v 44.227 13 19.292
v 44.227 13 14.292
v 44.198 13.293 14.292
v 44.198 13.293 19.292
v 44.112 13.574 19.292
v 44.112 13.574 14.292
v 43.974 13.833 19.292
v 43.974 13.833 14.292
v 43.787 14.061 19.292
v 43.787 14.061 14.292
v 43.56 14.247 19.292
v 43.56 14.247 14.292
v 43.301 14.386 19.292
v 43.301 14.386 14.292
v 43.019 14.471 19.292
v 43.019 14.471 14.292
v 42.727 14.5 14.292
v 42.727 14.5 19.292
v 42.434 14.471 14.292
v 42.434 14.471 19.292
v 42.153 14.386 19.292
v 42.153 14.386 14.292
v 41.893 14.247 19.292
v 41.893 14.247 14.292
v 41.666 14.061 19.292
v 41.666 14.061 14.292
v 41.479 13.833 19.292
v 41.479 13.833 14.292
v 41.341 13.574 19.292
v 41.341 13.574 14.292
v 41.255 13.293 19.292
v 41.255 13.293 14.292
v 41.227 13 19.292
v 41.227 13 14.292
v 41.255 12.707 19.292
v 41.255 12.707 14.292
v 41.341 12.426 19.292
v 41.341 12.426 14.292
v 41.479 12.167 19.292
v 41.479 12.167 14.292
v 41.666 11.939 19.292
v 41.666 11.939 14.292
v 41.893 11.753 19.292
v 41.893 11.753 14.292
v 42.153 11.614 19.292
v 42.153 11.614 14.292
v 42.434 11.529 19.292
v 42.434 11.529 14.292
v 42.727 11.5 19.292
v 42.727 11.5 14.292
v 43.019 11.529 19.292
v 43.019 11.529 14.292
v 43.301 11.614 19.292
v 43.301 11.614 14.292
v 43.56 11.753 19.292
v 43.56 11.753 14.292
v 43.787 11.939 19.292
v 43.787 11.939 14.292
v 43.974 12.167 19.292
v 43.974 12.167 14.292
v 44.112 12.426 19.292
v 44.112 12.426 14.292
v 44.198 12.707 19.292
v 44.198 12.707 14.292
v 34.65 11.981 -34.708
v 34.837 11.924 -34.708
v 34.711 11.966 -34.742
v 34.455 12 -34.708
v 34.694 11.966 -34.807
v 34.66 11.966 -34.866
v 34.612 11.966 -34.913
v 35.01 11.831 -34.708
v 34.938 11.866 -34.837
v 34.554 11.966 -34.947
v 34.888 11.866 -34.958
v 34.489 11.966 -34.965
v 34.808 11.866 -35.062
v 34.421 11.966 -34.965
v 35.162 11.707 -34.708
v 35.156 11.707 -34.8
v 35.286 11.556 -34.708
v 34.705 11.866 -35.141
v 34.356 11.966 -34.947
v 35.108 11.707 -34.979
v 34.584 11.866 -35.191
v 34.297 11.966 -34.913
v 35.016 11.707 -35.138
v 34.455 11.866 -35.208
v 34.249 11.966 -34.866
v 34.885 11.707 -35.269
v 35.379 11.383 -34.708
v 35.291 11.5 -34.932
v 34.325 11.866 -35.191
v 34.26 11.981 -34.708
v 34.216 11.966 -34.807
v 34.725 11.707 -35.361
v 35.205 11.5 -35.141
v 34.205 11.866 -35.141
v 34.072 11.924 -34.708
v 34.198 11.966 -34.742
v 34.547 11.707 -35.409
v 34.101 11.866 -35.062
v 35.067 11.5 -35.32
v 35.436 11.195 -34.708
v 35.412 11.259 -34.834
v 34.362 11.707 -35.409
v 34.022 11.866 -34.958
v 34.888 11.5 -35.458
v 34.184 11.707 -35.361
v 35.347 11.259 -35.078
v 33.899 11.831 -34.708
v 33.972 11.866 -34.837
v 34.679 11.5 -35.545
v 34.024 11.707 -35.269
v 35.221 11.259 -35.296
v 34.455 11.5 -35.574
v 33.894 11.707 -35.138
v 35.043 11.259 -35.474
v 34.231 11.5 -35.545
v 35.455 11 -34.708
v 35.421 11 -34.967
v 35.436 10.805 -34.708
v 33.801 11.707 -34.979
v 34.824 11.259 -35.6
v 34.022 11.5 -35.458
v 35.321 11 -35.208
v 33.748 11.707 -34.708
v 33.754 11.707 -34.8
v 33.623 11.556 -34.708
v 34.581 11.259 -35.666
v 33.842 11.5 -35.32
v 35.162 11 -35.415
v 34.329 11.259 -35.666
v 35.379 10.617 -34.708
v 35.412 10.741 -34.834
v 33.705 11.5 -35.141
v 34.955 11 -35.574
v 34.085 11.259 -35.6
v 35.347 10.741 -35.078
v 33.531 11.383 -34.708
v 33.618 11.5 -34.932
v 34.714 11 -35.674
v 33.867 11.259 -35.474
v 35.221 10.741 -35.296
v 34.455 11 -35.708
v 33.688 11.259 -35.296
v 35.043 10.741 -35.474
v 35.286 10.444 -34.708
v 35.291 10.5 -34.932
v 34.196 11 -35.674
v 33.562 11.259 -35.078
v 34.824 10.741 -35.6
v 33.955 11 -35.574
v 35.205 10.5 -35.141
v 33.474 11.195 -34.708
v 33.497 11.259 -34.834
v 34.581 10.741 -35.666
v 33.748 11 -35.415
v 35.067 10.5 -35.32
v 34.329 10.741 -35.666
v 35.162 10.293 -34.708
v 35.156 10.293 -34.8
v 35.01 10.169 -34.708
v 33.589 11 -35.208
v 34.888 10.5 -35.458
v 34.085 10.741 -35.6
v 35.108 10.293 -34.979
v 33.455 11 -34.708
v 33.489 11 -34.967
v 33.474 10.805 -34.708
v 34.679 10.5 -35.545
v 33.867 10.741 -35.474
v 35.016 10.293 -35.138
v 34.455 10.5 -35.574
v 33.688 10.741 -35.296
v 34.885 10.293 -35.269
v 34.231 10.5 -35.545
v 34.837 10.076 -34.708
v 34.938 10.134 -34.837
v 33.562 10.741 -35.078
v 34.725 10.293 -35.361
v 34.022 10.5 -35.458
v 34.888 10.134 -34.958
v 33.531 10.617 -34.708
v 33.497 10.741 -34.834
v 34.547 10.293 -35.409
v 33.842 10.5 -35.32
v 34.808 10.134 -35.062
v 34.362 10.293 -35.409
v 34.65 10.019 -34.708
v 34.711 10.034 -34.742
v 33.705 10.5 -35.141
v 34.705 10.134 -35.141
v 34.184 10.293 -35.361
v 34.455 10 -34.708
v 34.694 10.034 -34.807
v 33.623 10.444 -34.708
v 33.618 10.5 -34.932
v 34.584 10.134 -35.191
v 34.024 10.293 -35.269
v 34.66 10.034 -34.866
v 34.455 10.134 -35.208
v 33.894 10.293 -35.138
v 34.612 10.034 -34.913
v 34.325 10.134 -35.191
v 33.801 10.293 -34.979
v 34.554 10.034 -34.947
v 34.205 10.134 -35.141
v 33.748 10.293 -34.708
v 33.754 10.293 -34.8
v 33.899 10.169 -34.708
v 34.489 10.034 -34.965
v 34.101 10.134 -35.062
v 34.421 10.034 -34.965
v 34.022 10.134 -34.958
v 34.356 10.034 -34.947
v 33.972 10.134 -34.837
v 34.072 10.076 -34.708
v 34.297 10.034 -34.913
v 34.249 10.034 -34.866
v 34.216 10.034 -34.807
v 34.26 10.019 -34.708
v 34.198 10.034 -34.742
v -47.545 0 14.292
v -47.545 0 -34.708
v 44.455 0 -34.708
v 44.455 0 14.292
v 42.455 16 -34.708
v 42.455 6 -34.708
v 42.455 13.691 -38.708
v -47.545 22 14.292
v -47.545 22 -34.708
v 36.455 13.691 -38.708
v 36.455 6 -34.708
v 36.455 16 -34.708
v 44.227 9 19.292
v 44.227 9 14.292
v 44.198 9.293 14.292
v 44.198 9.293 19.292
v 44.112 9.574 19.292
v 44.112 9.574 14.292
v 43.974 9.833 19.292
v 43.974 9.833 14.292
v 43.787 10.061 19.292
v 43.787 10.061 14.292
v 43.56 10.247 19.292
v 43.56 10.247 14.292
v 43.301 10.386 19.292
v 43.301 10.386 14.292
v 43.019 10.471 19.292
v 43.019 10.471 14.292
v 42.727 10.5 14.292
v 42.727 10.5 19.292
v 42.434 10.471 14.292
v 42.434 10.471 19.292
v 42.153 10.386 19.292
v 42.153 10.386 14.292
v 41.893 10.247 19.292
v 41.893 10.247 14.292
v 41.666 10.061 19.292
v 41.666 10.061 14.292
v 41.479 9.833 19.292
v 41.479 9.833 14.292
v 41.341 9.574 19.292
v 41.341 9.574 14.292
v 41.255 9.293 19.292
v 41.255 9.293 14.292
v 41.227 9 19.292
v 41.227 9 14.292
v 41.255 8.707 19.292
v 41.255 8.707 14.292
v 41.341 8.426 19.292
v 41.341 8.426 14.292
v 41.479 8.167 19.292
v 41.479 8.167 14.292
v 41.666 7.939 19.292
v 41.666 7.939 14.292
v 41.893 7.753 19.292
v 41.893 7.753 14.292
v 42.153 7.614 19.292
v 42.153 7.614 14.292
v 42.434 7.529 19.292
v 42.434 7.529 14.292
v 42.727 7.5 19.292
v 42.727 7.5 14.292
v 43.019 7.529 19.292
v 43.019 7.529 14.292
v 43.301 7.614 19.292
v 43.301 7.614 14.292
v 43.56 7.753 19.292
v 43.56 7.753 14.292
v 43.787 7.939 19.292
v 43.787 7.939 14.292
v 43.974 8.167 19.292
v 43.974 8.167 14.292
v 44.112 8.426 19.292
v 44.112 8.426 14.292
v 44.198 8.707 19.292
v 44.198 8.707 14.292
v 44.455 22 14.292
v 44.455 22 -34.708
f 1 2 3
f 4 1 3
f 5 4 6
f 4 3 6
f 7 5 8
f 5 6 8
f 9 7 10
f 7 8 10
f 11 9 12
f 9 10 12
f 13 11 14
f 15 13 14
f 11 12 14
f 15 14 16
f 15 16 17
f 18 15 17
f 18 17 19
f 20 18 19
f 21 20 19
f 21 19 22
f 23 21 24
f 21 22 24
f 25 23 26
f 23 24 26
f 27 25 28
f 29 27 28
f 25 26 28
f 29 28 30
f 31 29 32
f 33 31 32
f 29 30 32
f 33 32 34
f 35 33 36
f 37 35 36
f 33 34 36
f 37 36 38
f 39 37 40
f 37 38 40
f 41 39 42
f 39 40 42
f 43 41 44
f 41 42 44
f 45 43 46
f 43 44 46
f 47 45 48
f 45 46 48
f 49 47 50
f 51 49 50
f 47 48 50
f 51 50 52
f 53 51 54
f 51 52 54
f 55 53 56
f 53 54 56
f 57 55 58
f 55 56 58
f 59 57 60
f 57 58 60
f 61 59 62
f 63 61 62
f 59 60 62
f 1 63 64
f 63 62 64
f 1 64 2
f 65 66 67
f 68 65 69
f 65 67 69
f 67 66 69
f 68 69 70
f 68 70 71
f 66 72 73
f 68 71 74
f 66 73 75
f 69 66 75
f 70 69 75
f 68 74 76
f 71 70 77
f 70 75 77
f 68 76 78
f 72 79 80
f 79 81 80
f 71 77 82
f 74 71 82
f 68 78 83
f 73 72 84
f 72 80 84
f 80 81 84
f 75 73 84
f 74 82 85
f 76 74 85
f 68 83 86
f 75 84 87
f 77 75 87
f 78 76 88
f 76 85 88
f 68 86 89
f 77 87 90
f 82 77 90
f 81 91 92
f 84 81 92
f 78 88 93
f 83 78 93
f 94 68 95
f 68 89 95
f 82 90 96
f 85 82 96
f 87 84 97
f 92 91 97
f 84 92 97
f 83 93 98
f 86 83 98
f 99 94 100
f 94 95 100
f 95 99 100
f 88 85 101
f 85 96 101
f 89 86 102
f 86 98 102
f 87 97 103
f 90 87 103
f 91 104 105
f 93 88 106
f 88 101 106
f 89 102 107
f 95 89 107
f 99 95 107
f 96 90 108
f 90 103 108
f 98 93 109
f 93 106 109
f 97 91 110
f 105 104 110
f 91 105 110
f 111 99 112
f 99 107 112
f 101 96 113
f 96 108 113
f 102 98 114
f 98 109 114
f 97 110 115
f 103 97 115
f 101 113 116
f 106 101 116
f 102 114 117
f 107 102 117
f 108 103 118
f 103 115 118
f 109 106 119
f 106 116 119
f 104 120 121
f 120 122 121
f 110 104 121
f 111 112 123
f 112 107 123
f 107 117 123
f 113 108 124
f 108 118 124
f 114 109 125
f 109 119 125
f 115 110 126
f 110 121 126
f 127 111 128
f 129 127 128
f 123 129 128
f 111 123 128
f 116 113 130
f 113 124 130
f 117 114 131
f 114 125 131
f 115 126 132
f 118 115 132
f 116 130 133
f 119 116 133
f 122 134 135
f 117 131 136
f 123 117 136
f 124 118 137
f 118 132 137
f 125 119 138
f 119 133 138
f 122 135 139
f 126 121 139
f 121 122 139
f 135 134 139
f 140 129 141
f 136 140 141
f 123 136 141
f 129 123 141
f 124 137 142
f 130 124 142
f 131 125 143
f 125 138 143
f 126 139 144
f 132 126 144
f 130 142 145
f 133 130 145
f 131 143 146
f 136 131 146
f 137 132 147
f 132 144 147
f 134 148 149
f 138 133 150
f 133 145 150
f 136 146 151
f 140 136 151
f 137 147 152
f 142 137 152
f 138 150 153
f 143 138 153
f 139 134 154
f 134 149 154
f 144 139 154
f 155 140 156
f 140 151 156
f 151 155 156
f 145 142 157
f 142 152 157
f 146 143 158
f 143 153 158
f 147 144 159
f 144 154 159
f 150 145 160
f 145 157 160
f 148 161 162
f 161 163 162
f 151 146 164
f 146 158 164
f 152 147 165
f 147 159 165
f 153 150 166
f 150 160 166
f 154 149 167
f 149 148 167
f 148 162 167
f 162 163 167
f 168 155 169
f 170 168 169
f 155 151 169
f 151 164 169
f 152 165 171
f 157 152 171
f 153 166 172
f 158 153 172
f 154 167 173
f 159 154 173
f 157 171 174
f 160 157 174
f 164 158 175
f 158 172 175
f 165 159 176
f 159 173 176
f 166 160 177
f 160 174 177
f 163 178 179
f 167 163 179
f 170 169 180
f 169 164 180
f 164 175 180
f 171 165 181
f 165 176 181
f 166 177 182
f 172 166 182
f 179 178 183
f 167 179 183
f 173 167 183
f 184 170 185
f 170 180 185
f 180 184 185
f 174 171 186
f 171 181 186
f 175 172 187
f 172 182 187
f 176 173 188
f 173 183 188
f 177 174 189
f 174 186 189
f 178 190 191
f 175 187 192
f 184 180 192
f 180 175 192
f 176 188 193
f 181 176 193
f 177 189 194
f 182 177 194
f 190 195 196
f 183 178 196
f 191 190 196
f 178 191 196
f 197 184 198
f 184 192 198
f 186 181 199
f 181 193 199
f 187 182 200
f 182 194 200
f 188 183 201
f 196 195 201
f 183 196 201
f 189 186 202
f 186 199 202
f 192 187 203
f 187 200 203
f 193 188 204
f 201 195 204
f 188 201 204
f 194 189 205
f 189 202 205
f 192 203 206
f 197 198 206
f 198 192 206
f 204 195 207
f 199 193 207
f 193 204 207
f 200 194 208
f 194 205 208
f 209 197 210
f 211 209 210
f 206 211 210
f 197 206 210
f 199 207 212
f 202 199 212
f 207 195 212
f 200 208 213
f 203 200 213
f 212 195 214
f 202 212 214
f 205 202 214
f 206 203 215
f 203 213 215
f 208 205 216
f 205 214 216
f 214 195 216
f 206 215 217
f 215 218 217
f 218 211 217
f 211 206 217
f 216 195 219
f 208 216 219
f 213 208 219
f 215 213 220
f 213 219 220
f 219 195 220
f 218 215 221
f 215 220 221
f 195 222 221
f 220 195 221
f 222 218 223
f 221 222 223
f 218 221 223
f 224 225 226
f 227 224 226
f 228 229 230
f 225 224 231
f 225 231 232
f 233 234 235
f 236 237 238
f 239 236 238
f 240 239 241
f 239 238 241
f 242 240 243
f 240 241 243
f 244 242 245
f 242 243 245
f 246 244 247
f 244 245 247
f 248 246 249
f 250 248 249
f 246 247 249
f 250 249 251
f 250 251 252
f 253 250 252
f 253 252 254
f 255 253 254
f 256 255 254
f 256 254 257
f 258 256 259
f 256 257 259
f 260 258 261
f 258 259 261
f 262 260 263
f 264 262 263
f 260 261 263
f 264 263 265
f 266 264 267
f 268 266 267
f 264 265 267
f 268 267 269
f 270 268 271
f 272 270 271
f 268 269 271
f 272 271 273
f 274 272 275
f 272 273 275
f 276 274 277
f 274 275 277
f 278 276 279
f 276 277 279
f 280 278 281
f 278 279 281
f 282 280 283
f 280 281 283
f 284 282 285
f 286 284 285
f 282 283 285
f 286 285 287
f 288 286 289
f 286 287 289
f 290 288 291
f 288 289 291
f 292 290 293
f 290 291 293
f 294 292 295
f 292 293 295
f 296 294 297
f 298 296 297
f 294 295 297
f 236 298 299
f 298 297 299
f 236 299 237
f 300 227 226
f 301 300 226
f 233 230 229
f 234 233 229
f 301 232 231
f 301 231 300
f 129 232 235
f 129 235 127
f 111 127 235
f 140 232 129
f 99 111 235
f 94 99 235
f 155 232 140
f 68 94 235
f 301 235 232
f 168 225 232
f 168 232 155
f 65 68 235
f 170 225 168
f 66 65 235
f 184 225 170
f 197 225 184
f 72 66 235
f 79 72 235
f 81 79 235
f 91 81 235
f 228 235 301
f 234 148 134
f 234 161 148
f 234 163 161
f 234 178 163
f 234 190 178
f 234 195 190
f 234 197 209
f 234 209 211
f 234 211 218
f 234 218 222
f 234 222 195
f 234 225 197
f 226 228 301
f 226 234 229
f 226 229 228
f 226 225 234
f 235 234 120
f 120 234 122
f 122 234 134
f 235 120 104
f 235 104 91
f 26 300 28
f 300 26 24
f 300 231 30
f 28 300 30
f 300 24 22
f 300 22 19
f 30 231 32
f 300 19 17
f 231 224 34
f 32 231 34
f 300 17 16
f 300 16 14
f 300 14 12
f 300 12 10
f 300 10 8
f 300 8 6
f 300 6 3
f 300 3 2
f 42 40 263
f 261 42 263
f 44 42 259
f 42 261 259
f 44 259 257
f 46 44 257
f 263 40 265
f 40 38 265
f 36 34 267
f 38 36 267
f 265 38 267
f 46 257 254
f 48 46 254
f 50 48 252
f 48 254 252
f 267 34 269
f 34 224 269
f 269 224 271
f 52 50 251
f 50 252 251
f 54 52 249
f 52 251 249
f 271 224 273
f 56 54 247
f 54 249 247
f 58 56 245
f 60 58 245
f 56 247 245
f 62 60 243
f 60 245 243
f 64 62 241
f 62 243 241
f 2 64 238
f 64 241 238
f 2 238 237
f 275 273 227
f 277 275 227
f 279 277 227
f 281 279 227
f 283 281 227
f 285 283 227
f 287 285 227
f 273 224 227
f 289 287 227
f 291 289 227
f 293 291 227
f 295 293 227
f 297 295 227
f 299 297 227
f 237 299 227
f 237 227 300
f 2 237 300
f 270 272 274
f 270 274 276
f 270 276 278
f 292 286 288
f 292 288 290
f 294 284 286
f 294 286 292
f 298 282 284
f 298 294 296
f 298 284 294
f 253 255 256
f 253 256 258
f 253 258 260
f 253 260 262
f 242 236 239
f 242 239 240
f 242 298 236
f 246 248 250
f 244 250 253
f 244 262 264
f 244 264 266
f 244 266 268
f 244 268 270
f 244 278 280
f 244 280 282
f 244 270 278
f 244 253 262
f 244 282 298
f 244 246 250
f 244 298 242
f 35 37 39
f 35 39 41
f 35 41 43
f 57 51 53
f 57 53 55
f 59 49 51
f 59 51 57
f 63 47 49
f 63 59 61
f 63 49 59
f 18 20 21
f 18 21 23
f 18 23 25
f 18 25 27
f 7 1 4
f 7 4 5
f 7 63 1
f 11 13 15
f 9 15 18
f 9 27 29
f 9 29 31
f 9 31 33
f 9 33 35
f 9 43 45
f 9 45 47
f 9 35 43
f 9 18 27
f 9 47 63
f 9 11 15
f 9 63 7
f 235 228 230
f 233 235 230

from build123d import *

# Parameters (mm, degrees)
SKETCH_1_W          = 92
SKETCH_1_H          = 49
EXTRUDE_1_DEPTH     = 22
SKETCH_2_W          = 6
SKETCH_2_H          = 10
EXTRUDE_2_DEPTH     = 4
CUT_EXTRUDE_2_DEPTH = 91
SKETCH_5_R          = 1.5
EXTRUDE_3_DEPTH     = 5


with BuildPart() as part:
    # 草图1 → 凸台-拉伸1 (new body)
    with BuildSketch(Plane(origin=(0, 0, 0), x_dir=(1, 0, 0), z_dir=(0, 1, 0))):
        with Locations((-1.545219638, 10.208010336)):
            Rectangle(SKETCH_1_W, SKETCH_1_H)
    extrude(amount=EXTRUDE_1_DEPTH)

    # 草图2 → 凸台-拉伸2 (add)
    with BuildSketch(Plane(origin=(0, 0, -34.708010336), x_dir=(-1, 0, 0), z_dir=(0, 0, -1))):
        with Locations((-39.454780362, 11)):
            Rectangle(SKETCH_2_W, SKETCH_2_H)
    extrude(amount=EXTRUDE_2_DEPTH)

    # 草图3 → 切除-拉伸2 (cut, through all)
    with BuildSketch(Plane(origin=(42.454780362, 0, 0), x_dir=(0, 0, -1), z_dir=(1, 0, 0))):
        Polygon((38.708010336, 16), (34.708010336, 16), (38.708010336, 13.690598923), align=None)
        Polygon((38.708010336, 13.690598923), (34.708010336, 6), (38.708010336, 6), align=None)
    extrude(amount=-CUT_EXTRUDE_2_DEPTH, mode=Mode.SUBTRACT)

    # 草图4 → 旋转1 (revolve)
    with BuildSketch(Plane(origin=(0, 0, -34.708010336), x_dir=(-1, 0, 0), z_dir=(0, 0, -1))):
        with BuildLine():
            Line((-34.454780362, 11), (-34.454780362, 12))
            ThreePointArc((-34.454780362, 12), (-33.454780362, 11), (-34.454780362, 10))
            Line((-34.454780362, 10), (-34.454780362, 11))
        make_face()
    revolve(axis=Axis((34.454780362, 11, -34.708010336), (0, 1, 0)))

    # 草图5 → 凸台-拉伸3 (add)
    with BuildSketch(Plane.XY.offset(14.291989664)):
        with Locations((42.72658272, 13)):
            Circle(SKETCH_5_R)
        with Locations((42.72658272, 9)):
            Circle(SKETCH_5_R)
    extrude(amount=EXTRUDE_3_DEPTH)


solid = part.part
